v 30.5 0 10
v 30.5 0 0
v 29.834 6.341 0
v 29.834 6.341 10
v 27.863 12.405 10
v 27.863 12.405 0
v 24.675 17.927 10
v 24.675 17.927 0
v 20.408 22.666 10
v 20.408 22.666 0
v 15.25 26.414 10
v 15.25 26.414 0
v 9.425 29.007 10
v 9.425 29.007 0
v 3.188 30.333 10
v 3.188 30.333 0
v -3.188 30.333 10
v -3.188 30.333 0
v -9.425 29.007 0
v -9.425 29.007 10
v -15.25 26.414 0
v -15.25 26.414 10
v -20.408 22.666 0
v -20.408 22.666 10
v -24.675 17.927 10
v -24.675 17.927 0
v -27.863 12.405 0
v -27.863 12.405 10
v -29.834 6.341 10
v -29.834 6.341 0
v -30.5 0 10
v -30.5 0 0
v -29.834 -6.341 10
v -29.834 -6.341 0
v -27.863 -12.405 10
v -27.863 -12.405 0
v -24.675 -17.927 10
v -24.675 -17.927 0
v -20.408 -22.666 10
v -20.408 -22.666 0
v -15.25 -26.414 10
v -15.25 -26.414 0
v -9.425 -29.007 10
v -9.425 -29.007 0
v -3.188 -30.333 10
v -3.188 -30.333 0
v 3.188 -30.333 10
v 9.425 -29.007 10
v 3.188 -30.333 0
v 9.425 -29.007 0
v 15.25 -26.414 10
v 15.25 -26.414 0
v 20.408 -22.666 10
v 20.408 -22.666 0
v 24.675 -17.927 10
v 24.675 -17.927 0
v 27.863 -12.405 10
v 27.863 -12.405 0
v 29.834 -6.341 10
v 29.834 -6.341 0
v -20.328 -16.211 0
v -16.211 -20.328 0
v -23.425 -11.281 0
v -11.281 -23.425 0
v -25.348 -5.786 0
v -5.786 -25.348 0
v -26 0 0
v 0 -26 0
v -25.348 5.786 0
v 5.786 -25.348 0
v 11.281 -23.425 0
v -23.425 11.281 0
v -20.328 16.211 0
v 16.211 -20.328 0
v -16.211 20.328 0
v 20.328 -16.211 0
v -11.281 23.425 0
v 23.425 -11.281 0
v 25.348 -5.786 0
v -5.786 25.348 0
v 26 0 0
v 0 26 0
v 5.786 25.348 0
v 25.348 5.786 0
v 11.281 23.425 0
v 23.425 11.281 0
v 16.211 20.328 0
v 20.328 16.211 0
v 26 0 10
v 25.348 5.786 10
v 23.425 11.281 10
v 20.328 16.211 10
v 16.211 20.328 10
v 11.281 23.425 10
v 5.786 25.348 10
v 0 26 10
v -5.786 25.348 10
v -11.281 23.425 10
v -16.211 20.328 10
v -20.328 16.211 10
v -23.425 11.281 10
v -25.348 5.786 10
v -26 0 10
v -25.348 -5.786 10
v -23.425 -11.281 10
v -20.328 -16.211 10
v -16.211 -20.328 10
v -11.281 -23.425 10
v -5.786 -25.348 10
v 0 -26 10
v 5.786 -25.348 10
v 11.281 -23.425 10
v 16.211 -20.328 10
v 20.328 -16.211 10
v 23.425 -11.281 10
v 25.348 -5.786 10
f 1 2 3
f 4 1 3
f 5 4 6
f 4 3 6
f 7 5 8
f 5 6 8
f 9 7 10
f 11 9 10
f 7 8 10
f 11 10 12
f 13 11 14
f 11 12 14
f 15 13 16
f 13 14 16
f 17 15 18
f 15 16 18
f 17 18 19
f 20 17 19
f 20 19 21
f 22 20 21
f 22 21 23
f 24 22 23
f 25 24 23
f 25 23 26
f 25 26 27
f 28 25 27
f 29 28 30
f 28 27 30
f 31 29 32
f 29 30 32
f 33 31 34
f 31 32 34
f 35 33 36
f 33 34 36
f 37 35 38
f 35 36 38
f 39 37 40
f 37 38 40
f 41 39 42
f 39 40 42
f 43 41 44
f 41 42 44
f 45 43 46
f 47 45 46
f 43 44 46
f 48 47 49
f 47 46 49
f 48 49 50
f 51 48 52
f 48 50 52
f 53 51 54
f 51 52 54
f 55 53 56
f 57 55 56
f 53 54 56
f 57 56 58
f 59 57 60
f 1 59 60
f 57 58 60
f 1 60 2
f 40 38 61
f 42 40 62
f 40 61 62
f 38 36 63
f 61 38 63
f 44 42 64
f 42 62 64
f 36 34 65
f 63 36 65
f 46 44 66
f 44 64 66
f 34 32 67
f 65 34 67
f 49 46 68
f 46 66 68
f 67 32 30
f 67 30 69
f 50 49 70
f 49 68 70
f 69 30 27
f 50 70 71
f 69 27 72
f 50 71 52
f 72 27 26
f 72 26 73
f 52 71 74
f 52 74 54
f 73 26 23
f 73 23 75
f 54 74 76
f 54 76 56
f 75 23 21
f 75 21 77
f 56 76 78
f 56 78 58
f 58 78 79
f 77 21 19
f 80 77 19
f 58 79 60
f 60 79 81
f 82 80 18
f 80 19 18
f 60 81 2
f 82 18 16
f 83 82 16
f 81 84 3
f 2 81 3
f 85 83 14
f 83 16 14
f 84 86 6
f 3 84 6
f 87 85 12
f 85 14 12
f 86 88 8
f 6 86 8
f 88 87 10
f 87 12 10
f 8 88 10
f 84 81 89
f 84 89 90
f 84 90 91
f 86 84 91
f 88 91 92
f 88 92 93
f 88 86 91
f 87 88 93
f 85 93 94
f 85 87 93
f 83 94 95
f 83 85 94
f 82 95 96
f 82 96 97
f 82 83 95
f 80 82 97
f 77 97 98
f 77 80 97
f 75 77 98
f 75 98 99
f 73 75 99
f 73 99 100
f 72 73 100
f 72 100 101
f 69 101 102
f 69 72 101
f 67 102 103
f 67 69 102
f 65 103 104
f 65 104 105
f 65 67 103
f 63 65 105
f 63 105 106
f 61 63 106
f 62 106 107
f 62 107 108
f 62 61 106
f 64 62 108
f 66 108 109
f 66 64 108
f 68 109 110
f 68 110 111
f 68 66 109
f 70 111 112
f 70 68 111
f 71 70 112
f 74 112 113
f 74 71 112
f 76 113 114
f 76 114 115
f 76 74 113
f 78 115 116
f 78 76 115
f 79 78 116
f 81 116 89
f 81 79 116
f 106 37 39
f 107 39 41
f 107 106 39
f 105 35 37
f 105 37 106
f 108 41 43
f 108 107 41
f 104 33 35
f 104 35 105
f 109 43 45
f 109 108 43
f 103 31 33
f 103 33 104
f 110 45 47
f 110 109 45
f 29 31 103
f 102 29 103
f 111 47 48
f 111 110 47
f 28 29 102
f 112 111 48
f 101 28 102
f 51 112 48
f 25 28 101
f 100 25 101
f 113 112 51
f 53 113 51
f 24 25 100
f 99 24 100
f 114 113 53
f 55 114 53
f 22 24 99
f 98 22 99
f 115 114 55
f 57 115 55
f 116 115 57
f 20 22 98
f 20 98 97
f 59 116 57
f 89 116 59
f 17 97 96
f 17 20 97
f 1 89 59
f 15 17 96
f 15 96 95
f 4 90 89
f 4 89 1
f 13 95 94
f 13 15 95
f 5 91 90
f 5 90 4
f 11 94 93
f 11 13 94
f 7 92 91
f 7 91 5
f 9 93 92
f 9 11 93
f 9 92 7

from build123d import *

# Parameters (mm, degrees)
F0_R     = 40
F0_R_2   = 35.5
F1_DEPTH = 10
F0_R_3   = 30.5
F0_R_4   = 26


with BuildPart() as f1:
    # F0 (on Top) → F1 (new body)
    with BuildSketch(Plane.XY):
        Circle(F0_R)
        Circle(F0_R_2, mode=Mode.SUBTRACT)
    extrude(amount=F1_DEPTH)


with BuildPart() as f1b:
    # F0 (on Top) → F1, piece 2 (new body)
    with BuildSketch(Plane.XY):
        Circle(F0_R_3)
        Circle(F0_R_4, mode=Mode.SUBTRACT)
    extrude(amount=F1_DEPTH)


solid = f1b.part
